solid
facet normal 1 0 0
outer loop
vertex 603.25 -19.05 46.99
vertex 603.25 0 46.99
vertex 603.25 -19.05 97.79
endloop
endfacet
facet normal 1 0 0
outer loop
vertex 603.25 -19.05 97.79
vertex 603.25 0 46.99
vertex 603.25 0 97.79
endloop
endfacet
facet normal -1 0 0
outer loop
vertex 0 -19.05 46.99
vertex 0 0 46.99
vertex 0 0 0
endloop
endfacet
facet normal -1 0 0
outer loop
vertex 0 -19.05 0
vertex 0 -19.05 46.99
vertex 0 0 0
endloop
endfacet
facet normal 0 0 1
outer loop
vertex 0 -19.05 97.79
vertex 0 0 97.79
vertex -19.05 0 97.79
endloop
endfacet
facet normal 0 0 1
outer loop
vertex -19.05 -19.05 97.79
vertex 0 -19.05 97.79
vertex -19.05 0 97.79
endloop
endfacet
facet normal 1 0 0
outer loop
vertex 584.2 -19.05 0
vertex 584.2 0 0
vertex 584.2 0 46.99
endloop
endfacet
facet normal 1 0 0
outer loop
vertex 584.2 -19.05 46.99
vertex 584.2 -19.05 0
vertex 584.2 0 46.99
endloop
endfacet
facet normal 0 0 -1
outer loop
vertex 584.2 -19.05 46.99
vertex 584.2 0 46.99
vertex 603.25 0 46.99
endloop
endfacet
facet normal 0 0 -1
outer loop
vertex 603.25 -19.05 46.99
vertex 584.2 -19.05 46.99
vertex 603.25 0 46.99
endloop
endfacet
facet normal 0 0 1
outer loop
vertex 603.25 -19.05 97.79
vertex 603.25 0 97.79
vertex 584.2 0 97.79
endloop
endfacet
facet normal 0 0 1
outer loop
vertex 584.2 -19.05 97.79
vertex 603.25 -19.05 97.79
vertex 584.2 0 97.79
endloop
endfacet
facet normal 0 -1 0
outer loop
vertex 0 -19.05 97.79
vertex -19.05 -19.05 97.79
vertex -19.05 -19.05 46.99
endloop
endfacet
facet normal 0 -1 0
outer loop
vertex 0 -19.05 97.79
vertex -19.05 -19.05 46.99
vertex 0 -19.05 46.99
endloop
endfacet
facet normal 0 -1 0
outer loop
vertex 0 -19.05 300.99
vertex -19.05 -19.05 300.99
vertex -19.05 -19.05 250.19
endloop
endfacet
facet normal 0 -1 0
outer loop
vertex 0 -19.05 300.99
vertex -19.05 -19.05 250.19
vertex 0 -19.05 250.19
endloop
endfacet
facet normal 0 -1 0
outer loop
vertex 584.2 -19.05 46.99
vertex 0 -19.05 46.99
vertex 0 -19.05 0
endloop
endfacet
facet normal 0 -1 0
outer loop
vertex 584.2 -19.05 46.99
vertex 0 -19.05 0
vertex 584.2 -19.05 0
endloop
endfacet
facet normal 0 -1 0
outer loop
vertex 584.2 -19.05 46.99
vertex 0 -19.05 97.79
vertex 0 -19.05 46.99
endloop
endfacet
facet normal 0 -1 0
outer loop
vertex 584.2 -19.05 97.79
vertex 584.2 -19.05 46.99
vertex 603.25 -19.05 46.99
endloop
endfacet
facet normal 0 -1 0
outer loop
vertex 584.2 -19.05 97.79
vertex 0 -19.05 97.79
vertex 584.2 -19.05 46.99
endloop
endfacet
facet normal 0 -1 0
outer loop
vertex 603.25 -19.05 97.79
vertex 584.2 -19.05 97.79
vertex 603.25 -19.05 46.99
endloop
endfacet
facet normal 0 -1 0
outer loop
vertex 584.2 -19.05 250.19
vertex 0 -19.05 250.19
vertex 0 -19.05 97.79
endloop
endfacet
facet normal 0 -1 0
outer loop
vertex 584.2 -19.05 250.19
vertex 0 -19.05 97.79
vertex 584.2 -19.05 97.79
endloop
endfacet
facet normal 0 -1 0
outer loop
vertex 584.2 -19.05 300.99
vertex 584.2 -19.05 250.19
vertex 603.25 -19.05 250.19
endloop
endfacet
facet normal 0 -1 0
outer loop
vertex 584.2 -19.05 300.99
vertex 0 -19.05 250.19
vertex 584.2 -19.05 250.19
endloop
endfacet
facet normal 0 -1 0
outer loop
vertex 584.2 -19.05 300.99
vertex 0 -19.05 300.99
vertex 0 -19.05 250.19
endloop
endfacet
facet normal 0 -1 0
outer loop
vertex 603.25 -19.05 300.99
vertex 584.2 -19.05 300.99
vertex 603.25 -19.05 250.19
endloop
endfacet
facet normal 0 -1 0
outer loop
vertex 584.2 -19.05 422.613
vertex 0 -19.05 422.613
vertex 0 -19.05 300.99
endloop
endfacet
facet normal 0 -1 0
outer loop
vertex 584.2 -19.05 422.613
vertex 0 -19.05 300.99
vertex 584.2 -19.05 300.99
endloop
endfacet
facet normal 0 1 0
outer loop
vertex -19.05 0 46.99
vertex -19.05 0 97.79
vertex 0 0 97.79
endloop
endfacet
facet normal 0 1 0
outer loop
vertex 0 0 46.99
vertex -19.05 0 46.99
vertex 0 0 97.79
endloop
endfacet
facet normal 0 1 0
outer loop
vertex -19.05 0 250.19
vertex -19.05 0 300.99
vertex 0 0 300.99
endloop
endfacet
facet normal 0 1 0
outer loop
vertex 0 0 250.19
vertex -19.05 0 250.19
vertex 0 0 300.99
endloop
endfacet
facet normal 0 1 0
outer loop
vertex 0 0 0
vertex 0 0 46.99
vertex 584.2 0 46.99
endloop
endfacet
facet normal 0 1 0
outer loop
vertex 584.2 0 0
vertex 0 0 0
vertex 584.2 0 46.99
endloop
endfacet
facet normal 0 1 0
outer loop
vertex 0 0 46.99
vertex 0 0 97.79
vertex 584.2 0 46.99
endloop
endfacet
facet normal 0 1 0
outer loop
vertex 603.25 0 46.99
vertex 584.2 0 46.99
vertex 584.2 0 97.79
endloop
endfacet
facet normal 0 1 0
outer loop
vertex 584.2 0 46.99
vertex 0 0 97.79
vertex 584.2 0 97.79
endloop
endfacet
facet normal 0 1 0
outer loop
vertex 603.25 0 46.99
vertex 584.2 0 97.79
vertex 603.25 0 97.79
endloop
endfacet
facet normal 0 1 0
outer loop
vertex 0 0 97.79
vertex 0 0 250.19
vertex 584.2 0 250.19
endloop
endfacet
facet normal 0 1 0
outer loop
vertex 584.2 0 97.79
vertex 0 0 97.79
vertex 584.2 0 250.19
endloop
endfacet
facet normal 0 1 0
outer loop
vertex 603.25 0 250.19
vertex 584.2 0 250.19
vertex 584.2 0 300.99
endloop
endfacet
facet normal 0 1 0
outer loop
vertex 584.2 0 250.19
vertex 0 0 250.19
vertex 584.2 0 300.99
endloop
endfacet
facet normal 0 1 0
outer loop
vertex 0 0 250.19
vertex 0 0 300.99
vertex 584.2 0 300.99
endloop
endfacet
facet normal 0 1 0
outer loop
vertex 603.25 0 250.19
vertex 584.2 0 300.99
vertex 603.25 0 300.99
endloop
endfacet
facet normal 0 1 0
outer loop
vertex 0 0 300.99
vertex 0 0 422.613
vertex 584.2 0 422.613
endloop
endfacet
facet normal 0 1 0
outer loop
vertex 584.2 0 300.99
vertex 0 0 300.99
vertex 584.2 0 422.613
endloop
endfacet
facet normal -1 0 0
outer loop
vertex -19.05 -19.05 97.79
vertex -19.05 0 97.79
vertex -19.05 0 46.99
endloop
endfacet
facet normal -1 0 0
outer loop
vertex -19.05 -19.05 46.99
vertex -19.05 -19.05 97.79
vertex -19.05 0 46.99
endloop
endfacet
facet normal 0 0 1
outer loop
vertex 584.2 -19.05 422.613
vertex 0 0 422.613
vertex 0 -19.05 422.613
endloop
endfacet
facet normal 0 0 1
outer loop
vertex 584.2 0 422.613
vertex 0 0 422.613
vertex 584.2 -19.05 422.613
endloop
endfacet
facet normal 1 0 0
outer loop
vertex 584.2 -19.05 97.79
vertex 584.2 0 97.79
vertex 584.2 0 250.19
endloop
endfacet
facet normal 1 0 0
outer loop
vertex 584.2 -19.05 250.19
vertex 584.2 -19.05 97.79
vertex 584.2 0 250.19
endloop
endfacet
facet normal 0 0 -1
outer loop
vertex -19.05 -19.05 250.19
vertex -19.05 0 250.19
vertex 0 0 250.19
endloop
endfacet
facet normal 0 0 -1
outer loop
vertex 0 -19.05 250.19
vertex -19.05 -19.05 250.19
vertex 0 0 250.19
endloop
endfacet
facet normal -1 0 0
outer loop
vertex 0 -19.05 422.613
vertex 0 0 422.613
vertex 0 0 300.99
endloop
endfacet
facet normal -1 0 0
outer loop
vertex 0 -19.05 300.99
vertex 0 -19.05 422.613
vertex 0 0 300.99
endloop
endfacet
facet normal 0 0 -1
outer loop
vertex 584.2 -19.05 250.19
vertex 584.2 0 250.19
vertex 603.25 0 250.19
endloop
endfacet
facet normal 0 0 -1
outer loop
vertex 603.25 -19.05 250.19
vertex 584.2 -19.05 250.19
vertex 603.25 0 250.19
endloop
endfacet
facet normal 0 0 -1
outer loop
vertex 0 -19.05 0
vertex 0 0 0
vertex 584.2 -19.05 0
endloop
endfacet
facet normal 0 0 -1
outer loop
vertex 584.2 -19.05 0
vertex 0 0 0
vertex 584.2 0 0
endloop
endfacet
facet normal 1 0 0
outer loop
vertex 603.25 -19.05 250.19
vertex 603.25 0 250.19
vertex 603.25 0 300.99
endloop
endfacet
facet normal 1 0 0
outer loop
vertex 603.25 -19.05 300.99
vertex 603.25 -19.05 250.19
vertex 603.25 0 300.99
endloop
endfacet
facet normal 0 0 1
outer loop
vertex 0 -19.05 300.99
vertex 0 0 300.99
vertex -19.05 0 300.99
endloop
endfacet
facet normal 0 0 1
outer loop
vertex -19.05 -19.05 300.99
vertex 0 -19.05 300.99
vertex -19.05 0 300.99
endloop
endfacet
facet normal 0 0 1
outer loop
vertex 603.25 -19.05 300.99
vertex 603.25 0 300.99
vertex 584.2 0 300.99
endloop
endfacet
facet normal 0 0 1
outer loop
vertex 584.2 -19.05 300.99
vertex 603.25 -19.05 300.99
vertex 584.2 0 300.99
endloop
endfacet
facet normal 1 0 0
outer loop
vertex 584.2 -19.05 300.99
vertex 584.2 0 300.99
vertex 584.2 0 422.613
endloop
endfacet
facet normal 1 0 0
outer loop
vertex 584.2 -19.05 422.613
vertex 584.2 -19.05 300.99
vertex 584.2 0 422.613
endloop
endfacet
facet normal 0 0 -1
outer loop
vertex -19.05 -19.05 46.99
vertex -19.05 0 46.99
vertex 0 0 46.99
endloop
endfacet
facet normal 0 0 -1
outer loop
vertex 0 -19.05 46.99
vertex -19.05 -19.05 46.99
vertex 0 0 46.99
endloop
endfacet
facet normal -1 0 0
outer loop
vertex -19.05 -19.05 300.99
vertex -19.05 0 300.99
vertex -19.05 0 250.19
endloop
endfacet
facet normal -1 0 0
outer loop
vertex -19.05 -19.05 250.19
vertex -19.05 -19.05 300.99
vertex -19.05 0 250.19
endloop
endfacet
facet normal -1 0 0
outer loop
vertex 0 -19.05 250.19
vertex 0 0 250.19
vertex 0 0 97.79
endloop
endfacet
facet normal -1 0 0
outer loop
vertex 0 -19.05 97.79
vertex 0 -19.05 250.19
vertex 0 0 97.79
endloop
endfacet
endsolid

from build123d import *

# Parameters (mm, degrees)
F0_W     = 584.2
F0_H     = 74.632816
F1_DEPTH = 19.05


with BuildPart() as f1:
    # F0 (on Front) → F1 (new body)
    with BuildSketch(Plane.XZ):
        Polygon((0, 46.99), (0, 0), (584.2, 0), (584.2, 46.99), (603.25, 46.99), (603.25, 97.79), (584.2, 97.79), (584.2, 250.19), (603.25, 250.19), (603.25, 300.99), (584.2, 300.99), (584.2, 347.98), (0, 347.98), (0, 300.99), (-19.05, 300.99), (-19.05, 250.19), (0, 250.19), (0, 97.79), (-19.05, 97.79), (-19.05, 46.99), align=None)
        with Locations((292.1, 385.296408)):
            Rectangle(F0_W, F0_H)
    extrude(amount=F1_DEPTH)


solid = f1.part
